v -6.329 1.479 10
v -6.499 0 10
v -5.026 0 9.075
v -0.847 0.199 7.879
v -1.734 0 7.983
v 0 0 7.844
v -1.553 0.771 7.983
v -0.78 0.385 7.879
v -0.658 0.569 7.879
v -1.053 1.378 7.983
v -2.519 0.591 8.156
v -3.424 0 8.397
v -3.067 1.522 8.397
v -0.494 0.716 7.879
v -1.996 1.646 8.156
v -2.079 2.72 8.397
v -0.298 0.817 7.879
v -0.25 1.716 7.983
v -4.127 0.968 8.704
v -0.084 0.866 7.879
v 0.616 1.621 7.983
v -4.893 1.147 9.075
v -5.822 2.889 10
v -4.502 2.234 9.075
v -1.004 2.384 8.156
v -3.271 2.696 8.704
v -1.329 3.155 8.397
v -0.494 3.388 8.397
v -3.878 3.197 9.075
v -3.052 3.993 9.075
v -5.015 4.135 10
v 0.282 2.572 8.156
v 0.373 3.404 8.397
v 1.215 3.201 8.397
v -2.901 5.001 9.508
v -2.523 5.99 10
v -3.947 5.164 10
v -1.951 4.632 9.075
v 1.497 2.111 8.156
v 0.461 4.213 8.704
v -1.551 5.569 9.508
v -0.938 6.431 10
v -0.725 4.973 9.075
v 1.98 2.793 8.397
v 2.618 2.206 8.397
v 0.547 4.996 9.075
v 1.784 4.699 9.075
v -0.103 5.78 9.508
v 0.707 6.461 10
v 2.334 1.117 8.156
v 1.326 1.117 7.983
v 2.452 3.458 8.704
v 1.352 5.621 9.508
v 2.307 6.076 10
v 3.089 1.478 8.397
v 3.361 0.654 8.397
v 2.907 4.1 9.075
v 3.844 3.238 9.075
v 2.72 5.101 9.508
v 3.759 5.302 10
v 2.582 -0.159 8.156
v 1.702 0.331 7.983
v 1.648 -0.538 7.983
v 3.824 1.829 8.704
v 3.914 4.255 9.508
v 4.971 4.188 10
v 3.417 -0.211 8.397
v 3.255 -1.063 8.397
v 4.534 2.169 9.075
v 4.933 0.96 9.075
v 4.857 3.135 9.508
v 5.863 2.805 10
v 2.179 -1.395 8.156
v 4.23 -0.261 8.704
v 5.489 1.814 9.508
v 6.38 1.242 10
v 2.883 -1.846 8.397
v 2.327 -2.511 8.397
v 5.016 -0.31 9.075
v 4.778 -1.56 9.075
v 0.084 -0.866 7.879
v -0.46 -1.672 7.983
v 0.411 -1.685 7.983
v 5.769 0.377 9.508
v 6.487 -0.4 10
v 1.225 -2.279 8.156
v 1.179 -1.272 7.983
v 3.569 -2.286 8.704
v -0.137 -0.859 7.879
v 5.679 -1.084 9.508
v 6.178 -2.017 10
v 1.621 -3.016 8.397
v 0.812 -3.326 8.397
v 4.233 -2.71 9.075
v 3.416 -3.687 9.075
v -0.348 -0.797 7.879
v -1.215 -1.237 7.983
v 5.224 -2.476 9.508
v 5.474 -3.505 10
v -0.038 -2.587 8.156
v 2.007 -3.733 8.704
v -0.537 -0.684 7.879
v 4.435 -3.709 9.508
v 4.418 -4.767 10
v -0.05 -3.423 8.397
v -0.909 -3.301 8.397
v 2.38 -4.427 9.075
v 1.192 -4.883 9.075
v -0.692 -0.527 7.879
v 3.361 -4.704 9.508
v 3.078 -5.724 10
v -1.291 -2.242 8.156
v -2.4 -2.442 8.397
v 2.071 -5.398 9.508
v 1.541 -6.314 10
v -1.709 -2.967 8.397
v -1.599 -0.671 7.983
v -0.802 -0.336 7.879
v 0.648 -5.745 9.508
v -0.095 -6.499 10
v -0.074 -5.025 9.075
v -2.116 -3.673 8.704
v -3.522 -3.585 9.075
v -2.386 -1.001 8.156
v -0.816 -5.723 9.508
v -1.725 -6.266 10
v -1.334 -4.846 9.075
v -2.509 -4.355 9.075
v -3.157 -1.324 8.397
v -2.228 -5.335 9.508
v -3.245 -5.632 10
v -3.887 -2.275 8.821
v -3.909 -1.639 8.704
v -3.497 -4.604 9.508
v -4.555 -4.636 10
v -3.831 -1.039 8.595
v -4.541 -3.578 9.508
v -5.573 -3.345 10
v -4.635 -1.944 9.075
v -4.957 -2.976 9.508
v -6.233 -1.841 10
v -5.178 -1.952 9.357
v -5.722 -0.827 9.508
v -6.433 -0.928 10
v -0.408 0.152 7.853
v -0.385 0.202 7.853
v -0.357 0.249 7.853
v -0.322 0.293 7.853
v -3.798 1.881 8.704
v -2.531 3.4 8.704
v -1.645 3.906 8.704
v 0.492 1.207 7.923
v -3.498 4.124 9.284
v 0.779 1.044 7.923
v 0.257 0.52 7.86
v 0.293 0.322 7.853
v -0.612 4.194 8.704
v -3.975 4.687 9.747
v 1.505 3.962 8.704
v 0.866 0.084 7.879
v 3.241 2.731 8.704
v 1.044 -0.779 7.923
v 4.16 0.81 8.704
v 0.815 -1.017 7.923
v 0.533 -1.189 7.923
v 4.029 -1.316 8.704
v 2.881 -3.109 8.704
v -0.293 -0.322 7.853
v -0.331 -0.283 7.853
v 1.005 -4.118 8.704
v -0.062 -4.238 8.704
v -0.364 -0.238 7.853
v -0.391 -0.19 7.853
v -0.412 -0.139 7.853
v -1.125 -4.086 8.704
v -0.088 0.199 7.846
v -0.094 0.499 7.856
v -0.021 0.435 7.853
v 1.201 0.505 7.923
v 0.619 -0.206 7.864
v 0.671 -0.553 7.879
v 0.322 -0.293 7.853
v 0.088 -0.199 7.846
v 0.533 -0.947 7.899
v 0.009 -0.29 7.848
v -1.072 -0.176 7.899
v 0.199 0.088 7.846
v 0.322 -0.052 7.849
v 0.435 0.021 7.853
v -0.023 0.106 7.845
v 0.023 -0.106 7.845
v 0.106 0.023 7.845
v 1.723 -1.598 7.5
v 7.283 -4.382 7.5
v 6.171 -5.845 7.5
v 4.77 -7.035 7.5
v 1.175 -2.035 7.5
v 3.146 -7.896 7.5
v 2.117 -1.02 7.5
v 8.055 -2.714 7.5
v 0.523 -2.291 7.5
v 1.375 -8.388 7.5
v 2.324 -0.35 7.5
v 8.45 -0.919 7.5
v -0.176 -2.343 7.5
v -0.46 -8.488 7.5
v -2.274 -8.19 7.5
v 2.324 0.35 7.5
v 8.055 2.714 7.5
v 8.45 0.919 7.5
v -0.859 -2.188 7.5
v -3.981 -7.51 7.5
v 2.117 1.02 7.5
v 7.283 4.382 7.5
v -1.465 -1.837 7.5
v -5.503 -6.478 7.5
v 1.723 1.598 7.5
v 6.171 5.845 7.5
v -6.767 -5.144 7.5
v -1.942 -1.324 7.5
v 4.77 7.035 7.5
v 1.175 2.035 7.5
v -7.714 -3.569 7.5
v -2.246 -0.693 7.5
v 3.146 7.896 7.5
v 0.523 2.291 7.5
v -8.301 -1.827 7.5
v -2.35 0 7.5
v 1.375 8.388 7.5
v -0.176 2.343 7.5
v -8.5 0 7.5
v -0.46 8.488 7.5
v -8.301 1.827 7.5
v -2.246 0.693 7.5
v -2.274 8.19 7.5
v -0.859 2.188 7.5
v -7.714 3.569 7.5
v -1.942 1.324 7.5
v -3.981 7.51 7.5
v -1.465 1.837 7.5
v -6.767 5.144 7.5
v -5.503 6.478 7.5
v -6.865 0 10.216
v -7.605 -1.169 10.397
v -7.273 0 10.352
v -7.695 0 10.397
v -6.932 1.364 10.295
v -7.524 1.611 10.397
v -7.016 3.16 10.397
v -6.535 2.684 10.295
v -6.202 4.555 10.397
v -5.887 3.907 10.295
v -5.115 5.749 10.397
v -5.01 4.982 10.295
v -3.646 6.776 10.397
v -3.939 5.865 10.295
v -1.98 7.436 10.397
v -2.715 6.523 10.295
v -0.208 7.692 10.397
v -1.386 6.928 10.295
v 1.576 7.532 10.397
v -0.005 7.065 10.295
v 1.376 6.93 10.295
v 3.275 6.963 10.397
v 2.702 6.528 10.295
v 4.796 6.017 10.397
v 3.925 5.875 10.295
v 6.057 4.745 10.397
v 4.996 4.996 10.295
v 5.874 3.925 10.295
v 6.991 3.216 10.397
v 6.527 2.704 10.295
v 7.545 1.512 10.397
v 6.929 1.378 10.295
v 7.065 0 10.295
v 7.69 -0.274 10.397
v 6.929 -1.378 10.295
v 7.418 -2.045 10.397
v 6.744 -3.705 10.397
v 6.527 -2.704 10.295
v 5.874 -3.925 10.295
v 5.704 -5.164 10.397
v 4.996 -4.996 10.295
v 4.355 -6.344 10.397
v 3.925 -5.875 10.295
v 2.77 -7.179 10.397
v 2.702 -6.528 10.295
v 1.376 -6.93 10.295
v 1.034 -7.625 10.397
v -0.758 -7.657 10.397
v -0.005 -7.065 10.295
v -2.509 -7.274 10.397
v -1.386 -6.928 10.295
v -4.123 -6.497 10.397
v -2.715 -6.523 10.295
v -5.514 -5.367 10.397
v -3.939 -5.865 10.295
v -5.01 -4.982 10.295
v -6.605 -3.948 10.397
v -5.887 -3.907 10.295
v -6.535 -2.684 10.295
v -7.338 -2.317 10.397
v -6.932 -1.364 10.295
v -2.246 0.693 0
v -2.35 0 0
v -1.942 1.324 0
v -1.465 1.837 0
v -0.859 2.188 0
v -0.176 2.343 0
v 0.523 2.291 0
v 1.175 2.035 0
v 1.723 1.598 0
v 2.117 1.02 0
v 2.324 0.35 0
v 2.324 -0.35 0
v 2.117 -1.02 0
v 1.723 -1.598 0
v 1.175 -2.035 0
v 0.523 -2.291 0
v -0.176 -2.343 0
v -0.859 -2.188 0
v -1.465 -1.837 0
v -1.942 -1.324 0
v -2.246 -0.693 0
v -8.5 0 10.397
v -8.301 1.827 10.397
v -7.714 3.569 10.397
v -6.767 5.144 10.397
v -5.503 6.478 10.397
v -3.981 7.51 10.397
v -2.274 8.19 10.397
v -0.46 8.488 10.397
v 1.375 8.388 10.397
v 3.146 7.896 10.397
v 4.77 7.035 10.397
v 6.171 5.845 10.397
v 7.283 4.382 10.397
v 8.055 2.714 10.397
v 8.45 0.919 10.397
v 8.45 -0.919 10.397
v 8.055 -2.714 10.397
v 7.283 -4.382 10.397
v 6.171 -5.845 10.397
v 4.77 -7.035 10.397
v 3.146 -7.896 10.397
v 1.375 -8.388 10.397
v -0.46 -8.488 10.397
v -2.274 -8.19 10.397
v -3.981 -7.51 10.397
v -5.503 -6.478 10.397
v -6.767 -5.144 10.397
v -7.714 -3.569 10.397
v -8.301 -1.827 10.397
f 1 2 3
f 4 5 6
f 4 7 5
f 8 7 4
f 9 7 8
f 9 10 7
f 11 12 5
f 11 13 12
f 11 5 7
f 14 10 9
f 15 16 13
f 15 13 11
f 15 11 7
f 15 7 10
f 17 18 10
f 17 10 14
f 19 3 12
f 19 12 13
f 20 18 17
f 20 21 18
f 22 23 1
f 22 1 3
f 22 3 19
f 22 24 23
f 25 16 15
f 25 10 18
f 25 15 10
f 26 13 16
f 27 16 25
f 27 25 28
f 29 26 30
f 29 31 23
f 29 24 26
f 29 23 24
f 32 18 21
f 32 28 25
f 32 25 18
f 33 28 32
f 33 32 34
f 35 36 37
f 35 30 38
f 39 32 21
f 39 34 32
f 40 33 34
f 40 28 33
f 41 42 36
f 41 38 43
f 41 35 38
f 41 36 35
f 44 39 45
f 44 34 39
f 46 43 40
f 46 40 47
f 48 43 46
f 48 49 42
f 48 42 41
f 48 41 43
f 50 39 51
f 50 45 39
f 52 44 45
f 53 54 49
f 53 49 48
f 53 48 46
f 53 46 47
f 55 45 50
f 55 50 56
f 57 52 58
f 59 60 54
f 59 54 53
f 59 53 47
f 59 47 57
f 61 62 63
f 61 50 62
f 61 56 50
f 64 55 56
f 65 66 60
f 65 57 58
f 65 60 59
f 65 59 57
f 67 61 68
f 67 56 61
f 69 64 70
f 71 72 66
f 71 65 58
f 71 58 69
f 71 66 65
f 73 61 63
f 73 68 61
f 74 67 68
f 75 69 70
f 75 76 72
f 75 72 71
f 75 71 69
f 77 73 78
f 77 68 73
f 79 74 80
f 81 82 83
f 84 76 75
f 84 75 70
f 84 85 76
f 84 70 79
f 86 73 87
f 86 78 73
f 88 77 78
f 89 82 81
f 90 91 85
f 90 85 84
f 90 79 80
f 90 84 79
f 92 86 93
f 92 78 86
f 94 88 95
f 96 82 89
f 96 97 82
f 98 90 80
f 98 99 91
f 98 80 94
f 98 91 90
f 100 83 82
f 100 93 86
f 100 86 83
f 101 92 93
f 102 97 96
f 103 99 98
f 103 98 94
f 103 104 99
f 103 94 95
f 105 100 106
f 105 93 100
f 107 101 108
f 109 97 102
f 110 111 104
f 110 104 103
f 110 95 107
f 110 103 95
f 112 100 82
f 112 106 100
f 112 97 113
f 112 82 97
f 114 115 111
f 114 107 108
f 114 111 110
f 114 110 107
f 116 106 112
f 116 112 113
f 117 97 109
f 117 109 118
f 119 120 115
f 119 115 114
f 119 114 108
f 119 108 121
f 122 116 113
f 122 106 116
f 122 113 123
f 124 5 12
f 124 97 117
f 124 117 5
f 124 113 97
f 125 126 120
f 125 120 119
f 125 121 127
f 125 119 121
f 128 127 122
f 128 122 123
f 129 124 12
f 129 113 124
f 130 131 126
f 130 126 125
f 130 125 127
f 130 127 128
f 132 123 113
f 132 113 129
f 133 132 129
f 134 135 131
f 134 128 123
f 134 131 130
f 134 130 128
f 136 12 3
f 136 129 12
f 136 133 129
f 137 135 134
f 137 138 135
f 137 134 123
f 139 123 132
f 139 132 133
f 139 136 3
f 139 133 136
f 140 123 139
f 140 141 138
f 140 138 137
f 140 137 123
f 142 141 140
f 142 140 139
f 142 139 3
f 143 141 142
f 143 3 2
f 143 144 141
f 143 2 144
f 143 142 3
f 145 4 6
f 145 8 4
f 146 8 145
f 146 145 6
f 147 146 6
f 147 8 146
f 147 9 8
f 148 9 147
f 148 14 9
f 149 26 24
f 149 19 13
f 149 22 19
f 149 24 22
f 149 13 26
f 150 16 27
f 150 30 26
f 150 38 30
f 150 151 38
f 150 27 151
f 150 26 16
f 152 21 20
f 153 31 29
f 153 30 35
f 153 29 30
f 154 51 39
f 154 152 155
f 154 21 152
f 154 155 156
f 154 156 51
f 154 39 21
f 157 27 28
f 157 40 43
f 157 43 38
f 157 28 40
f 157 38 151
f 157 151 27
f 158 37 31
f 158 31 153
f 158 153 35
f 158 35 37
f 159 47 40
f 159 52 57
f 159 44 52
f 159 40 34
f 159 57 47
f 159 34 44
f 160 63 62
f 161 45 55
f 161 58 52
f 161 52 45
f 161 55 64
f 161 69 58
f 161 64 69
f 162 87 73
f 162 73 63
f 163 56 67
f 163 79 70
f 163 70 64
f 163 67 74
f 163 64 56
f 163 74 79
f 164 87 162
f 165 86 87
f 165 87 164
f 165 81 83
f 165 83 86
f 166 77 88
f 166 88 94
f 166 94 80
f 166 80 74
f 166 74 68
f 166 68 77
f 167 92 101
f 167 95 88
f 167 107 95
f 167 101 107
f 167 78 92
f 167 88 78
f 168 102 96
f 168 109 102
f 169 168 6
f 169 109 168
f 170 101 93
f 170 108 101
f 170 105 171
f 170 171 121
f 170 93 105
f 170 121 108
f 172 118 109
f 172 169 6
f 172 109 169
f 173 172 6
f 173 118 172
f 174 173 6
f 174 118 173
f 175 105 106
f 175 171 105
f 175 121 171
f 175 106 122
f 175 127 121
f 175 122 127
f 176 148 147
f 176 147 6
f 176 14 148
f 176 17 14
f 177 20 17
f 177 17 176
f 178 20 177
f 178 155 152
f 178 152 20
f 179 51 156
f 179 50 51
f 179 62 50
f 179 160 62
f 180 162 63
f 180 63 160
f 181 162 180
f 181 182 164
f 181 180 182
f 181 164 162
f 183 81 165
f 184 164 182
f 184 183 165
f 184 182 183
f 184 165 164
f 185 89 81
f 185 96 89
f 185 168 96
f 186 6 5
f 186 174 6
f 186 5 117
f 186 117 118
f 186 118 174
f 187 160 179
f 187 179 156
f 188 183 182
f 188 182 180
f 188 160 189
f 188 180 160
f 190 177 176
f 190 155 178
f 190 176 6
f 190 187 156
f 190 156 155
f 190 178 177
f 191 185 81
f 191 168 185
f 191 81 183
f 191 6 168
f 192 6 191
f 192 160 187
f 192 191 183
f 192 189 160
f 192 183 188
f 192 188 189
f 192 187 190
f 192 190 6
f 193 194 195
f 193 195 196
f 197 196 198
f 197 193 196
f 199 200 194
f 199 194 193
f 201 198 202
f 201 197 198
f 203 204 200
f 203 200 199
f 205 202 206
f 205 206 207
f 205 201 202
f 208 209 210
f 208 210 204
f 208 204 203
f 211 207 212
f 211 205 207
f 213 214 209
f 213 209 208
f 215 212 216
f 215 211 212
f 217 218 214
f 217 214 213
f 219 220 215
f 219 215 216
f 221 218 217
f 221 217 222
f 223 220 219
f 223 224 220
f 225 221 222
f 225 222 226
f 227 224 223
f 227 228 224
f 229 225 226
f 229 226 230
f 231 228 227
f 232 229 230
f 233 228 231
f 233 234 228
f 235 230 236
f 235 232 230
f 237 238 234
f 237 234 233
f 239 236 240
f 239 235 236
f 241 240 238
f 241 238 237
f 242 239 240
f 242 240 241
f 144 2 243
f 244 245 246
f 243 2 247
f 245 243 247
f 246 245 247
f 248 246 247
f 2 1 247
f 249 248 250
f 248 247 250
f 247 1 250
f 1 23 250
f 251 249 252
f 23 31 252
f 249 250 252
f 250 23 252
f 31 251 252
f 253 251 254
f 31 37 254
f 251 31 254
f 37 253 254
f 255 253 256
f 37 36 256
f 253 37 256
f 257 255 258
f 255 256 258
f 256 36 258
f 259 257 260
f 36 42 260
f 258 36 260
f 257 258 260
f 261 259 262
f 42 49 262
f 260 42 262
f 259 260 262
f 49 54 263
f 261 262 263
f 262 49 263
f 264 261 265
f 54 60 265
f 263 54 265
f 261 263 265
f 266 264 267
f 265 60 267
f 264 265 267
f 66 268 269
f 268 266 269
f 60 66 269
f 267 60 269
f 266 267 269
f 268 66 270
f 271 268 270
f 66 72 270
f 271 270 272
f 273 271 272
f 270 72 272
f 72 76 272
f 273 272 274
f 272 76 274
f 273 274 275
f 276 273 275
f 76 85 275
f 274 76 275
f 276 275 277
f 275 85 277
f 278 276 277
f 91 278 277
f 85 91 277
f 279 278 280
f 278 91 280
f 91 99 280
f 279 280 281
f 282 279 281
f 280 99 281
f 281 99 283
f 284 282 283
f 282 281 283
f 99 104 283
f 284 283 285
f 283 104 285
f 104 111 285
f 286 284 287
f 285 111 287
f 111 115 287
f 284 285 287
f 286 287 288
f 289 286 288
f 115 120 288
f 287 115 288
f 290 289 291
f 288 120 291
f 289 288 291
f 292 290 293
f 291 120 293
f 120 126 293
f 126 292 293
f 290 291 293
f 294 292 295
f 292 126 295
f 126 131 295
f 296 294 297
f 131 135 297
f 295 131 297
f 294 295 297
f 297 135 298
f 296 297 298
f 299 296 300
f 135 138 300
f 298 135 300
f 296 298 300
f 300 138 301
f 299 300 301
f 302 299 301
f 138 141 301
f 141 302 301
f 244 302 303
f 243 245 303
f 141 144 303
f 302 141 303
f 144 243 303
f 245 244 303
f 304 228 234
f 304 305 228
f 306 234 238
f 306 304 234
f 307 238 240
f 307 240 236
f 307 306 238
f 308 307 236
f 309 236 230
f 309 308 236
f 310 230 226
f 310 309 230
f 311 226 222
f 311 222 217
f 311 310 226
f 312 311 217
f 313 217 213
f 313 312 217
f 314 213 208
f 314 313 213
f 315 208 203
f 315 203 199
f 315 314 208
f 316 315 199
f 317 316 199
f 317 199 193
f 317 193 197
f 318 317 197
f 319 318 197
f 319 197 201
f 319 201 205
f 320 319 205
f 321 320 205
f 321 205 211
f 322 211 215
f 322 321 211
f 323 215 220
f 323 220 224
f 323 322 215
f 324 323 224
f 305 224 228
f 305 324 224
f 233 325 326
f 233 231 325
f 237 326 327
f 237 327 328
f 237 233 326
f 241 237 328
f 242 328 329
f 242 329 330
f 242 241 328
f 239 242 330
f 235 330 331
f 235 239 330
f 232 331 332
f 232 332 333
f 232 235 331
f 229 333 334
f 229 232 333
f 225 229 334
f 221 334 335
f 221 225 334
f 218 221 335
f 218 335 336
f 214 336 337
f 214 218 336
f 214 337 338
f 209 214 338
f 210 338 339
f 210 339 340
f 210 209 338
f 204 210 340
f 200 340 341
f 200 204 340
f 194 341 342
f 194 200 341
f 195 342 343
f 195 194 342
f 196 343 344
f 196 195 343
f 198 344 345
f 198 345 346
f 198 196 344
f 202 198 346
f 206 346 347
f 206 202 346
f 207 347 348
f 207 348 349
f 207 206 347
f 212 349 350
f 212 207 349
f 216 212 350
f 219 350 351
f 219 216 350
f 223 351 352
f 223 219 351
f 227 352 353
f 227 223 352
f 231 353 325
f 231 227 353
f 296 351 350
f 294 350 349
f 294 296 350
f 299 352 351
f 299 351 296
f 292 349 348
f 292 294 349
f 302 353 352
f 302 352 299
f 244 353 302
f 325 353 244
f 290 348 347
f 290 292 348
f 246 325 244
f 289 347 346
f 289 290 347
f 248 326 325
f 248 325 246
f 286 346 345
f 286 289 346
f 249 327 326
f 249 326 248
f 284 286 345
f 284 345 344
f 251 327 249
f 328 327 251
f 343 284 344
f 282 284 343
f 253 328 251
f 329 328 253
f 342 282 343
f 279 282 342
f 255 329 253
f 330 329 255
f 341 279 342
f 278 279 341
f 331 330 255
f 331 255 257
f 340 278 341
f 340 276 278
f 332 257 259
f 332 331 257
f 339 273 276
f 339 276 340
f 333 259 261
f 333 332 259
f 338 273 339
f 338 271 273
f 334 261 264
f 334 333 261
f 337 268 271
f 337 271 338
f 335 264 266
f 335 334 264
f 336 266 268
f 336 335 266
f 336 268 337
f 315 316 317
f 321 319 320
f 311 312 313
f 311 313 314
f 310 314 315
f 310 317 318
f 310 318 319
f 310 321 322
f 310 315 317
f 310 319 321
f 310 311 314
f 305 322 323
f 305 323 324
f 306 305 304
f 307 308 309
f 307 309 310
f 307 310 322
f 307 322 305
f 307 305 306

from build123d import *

# Parameters (mm, degrees)
F2_R = 2


with BuildPart() as f1:
    # F0 (on Front) → F1 (revolve)
    with BuildSketch(Plane.XZ):
        with BuildLine():
            Line((-2.35, 0), (0, 0))
            Line((0, 0), (0, 7.84415))
            ThreePointArc((0, 7.84415), (-3.725421, 8.502268), (-7, 10.396736))
            Line((-7, 10.396736), (-8.5, 10.396736))
            Line((-8.5, 10.396736), (-8.5, 7.5))
            Line((-8.5, 7.5), (-2.35, 7.5))
            Line((-2.35, 7.5), (-2.35, 0))
        make_face()
    revolve(axis=Axis((0, 0, 3.922075), (0, 0, -1)))

    # F2
    f2_edges = [f1.edges().sort_by_distance(p)[0] for p in [
        (7, 0, 10.396736),
    ]]
    fillet(f2_edges, radius=F2_R)


solid = f1.part
